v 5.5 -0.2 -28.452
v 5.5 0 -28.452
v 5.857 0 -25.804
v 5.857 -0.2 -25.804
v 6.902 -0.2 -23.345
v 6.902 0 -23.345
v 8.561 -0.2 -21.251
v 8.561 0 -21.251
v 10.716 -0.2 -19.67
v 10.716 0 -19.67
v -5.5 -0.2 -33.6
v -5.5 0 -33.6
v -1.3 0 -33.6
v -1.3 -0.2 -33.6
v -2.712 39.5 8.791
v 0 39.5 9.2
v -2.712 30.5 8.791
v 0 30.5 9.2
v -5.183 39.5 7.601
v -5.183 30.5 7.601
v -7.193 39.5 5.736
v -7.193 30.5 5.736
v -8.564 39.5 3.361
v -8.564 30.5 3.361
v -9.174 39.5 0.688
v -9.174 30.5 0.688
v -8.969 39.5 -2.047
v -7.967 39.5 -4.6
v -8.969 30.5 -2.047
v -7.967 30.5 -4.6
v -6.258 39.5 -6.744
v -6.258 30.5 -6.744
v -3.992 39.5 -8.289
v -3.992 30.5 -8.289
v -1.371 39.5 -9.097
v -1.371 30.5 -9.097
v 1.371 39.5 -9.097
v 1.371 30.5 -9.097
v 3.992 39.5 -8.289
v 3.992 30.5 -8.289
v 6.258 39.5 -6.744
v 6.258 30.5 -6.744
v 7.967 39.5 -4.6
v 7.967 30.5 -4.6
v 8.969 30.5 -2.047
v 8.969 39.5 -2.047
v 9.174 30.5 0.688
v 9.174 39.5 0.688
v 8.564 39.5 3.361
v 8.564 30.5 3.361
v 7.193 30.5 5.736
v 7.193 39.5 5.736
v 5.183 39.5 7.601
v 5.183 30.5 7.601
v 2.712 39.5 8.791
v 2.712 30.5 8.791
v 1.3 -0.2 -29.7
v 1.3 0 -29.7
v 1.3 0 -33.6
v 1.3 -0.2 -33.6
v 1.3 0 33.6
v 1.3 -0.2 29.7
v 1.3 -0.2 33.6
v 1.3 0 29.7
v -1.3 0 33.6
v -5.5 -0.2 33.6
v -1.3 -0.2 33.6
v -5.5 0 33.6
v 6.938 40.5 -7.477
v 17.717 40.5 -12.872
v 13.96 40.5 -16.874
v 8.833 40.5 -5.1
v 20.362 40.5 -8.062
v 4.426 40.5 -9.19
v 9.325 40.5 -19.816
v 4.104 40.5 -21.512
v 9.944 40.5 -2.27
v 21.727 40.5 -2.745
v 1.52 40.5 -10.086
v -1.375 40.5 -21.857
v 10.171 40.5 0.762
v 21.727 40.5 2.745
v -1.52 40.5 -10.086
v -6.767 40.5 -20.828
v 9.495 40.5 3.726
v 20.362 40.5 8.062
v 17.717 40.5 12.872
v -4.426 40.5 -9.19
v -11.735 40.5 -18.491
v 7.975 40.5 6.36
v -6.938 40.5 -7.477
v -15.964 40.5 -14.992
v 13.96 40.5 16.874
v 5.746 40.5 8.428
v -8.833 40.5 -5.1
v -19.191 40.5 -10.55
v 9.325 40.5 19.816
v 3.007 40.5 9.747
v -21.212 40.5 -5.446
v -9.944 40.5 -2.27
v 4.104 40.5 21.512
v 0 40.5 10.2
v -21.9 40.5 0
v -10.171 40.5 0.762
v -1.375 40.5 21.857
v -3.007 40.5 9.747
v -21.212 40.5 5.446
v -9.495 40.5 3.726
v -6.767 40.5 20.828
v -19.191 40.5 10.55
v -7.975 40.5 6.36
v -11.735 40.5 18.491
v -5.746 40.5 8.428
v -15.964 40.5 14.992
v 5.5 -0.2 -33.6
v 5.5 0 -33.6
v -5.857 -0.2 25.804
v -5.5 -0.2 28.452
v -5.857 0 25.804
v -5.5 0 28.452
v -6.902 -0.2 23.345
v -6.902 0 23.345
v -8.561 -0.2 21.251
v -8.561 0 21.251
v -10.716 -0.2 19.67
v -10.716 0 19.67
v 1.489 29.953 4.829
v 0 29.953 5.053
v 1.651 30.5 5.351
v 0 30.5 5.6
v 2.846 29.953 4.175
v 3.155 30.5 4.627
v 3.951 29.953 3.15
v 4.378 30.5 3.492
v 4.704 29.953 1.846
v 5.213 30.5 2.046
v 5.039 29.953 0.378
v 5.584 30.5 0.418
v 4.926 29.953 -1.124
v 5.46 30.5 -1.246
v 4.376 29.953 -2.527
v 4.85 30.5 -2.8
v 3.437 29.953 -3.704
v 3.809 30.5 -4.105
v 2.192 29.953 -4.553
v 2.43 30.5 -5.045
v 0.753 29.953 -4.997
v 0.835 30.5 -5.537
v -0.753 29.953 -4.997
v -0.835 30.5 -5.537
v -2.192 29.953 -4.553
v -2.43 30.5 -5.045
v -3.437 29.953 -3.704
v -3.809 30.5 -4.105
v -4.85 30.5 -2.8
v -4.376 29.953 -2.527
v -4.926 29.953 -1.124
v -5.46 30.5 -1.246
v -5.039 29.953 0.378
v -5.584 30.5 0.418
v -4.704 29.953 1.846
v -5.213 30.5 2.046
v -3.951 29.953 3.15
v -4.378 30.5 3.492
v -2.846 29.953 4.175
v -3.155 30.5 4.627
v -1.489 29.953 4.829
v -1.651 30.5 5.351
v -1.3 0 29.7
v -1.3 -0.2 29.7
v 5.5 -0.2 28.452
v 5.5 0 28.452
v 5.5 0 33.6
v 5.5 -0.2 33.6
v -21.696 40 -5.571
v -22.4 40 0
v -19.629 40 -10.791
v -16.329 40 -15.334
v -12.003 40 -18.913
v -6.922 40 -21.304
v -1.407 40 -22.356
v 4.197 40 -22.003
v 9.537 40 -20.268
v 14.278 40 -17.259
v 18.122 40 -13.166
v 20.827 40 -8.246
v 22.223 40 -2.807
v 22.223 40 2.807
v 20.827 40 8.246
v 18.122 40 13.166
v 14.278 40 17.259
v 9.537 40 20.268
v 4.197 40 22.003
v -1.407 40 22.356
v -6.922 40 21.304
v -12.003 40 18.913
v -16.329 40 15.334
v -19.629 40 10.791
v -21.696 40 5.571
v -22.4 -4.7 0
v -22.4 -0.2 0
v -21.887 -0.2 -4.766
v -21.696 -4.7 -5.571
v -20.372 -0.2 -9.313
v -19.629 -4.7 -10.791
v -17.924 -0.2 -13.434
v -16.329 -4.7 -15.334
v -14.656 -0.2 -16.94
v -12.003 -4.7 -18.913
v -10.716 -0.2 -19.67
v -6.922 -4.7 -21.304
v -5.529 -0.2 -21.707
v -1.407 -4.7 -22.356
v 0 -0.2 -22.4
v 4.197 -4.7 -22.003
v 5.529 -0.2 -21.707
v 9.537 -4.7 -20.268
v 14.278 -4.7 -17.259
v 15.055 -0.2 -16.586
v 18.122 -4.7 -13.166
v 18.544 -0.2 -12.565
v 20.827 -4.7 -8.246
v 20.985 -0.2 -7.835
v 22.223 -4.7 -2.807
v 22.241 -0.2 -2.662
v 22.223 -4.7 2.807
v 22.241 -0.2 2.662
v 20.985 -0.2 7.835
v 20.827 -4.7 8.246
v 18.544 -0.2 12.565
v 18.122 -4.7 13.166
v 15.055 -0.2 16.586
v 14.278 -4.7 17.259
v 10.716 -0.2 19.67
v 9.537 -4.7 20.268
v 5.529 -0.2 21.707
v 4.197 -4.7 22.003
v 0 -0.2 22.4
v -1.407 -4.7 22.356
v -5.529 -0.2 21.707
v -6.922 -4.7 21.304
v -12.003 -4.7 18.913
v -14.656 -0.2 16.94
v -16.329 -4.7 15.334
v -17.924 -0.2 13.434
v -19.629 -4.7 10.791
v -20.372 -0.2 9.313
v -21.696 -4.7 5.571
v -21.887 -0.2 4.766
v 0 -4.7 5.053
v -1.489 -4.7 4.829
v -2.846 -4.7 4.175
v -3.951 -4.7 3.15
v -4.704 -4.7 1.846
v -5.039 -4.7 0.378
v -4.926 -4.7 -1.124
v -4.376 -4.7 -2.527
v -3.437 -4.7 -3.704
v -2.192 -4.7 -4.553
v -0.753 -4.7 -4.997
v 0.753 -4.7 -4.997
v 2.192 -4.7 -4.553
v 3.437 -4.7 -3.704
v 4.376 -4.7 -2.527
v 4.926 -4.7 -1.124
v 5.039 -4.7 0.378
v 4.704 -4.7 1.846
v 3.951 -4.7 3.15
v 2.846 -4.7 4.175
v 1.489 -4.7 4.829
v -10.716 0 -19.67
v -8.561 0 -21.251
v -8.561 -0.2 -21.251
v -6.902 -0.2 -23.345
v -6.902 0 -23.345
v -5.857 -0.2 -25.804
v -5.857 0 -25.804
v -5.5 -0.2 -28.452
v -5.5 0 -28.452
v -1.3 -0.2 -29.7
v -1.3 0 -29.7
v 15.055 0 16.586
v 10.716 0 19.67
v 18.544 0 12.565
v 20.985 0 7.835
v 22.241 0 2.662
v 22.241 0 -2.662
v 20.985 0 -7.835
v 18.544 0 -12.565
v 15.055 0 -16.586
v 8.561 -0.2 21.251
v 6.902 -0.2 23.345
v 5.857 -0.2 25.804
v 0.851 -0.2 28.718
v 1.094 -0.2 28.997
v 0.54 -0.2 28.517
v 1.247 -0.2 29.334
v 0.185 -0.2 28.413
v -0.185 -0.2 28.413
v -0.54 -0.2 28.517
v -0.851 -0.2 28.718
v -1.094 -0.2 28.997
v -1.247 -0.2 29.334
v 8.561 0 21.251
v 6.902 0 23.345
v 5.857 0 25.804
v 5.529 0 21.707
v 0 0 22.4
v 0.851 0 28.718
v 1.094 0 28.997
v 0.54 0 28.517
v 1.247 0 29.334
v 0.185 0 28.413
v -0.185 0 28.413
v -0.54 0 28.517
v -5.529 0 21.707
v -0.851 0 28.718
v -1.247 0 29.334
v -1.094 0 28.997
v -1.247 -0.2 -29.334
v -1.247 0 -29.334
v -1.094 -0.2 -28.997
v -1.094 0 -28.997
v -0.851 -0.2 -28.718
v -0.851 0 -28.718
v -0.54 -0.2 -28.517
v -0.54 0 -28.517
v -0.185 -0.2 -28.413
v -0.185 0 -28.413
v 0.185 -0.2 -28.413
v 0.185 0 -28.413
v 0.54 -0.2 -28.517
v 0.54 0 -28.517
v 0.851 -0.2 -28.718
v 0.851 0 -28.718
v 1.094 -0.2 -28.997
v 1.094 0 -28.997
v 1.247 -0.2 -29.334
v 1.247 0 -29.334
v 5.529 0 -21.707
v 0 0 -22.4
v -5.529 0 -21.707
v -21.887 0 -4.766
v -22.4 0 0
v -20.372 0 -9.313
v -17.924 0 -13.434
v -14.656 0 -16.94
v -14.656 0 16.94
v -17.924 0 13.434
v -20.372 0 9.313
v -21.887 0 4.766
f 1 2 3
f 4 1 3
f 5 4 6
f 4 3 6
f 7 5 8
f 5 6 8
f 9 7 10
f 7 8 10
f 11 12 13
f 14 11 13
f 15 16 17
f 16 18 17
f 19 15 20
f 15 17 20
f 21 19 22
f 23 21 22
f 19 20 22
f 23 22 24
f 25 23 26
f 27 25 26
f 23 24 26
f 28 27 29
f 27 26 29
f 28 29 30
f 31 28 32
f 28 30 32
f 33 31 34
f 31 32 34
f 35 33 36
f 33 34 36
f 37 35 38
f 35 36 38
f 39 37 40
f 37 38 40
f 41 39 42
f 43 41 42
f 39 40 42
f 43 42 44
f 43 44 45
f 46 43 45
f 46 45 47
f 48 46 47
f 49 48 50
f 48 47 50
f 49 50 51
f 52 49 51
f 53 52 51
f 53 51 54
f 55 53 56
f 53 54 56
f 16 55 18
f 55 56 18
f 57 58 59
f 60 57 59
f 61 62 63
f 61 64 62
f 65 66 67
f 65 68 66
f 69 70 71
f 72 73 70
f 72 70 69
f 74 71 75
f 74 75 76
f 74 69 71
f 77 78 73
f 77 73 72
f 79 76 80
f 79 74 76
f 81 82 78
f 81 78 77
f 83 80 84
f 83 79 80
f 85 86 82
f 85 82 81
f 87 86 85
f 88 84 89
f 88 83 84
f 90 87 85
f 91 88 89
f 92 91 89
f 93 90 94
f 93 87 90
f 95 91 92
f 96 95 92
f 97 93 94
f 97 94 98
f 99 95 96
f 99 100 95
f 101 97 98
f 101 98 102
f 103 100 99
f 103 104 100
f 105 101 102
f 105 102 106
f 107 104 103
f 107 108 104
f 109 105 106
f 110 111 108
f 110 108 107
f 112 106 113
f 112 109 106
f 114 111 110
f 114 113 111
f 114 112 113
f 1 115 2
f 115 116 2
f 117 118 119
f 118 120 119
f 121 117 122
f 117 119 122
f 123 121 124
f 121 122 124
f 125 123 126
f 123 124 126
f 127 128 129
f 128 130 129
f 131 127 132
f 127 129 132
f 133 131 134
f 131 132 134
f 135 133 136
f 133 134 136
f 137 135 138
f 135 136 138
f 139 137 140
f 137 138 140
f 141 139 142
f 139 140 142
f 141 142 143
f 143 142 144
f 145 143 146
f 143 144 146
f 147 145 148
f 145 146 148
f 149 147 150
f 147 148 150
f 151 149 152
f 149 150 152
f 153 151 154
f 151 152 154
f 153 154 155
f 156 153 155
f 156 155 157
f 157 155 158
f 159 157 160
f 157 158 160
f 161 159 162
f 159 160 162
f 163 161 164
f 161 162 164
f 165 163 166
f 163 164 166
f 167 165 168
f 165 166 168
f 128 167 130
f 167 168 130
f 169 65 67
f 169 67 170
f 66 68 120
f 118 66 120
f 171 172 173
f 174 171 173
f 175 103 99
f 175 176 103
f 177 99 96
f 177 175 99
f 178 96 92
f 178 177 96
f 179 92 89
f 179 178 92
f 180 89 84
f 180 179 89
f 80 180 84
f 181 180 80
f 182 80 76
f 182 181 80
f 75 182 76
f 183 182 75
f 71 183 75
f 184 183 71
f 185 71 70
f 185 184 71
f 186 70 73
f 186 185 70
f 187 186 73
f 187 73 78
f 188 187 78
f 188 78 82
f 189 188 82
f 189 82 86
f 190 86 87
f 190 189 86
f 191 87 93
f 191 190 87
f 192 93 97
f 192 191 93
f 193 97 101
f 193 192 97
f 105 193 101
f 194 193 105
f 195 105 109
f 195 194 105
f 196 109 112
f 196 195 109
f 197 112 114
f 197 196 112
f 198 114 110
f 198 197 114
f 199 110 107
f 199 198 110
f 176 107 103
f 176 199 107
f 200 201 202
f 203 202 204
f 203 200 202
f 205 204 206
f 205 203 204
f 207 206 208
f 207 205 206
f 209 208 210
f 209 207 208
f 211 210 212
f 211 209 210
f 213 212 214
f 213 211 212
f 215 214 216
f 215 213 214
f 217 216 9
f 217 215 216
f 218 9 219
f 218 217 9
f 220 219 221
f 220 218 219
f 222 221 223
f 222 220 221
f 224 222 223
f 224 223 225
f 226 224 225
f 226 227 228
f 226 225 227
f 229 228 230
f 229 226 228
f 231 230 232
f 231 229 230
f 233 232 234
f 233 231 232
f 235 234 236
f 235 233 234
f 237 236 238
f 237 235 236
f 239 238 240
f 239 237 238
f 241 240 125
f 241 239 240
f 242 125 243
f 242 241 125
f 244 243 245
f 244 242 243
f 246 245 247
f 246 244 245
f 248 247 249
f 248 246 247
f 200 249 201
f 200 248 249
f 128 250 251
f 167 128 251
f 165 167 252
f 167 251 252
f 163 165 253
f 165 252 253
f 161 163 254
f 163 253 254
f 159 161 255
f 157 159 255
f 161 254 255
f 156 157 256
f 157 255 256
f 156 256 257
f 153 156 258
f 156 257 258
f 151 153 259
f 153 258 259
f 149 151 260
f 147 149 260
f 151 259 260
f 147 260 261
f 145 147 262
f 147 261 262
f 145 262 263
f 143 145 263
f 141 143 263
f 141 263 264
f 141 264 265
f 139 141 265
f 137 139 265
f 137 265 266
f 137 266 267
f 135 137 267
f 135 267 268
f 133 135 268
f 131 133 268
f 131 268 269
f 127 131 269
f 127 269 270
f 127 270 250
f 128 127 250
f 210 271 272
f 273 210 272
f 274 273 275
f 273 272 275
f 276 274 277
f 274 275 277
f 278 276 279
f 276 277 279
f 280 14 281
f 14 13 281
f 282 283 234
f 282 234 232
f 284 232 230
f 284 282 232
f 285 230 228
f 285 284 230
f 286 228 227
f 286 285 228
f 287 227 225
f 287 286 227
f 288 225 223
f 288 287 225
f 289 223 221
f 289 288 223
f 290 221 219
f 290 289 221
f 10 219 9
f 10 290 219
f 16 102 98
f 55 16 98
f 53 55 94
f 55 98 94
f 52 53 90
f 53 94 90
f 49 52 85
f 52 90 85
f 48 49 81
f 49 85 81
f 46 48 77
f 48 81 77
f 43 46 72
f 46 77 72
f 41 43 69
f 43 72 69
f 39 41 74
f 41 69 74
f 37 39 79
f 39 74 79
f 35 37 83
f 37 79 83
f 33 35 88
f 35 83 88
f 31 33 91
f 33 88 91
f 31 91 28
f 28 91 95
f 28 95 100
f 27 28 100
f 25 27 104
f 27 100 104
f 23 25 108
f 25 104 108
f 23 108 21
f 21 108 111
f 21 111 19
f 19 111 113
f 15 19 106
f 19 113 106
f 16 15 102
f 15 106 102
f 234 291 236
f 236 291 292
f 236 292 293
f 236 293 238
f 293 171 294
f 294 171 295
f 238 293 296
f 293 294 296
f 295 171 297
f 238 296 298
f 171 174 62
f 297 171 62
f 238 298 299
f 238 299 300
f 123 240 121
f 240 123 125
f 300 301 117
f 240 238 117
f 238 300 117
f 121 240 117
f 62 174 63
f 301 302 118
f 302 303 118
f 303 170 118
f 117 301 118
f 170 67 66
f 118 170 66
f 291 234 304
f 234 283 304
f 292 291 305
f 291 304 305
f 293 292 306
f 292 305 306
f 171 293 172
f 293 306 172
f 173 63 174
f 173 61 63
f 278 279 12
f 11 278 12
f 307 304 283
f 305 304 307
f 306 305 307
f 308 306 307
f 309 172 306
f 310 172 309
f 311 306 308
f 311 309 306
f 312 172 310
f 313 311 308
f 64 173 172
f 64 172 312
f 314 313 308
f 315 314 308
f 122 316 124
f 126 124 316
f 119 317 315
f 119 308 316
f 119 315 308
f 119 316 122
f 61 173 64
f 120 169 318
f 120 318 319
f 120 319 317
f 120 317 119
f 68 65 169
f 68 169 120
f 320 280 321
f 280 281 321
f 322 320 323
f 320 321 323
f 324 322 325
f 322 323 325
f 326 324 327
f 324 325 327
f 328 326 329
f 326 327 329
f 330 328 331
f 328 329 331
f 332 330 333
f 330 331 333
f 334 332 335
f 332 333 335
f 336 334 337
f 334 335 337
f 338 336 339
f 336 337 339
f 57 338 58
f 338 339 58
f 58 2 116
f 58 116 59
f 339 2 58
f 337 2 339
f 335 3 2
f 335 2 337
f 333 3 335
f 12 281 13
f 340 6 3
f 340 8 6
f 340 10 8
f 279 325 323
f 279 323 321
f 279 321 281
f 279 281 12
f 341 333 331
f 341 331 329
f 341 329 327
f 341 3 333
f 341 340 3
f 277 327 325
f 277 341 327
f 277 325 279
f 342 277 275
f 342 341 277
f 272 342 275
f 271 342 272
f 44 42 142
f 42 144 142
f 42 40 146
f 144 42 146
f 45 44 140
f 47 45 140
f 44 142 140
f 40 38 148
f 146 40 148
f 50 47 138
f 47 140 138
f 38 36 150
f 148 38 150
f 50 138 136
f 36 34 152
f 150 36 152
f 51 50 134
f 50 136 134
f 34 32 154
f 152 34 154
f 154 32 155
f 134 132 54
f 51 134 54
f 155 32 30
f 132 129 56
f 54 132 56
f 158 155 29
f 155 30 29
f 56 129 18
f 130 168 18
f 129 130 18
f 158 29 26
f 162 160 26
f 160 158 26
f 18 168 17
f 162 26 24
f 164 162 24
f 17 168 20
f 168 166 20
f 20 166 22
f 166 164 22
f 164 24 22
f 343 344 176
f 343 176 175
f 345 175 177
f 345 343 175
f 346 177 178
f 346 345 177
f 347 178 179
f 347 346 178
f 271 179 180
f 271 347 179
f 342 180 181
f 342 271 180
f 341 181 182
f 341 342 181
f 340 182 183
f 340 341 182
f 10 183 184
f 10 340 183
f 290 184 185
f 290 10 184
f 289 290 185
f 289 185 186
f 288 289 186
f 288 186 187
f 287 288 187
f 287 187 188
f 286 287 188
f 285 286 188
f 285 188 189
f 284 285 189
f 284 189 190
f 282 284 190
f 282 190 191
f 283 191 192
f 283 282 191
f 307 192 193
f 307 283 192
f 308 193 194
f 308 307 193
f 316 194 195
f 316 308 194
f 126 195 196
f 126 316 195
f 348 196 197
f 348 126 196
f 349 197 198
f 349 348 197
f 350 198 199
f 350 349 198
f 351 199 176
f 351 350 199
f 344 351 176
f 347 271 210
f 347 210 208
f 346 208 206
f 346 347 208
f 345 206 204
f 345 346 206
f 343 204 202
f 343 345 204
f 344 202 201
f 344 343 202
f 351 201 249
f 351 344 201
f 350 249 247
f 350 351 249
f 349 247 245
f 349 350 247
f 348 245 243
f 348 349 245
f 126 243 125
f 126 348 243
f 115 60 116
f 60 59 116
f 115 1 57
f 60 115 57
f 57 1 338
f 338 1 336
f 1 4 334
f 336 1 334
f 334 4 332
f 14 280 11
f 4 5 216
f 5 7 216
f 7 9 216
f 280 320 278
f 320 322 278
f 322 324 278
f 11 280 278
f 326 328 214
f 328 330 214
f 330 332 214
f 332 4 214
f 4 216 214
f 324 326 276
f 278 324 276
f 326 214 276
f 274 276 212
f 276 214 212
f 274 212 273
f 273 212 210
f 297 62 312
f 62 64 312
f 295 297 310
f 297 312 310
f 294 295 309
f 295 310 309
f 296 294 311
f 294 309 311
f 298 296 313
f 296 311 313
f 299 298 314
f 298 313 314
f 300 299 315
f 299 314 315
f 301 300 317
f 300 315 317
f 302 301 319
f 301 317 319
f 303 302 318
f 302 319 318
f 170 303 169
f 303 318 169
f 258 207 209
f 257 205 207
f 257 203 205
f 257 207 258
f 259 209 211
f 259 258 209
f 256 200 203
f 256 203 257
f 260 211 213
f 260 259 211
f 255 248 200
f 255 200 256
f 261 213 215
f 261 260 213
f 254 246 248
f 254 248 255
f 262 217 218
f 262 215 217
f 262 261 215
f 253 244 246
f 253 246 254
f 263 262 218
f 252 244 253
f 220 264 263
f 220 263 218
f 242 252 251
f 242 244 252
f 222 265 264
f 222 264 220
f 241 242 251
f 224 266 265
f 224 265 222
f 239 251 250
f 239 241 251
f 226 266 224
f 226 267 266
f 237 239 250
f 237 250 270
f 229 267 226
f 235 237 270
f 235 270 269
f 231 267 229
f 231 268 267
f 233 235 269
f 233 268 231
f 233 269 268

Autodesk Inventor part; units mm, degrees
sketch "Sketch1" plane through (0, 0, 0) normal (0, 1, 0) x (-1, 0, 0)
  circle A0 centre (0, 0) radius 22.4
  dimension "d0" = 44.8
ref_plane "Work Plane1" through (0, 40.5, 0) normal (0, 1, 0) x (-1, 0, 0)
sketch "Sketch2" plane through (0, 40.5, 0) normal (0, 1, 0) x (-1, 0, 0)
  circle A0 centre (0, 0) radius 22.4 projected
ref_plane "Work Plane3" through (0, -53, 0) normal (0, 1, 0) x (-1, 0, 0)
ref_plane "Work Plane2" through (0, -41, 0) normal (0, 1, 0) x (-1, 0, 0)
sketch "Sketch3" plane through (0, -41, 0) normal (0, 1, 0) x (-1, 0, 0)
  circle A0 centre (0, 0) radius 33.8
  dimension "d4" = 67.6
sketch "Sketch4" plane through (0, -53, 0) normal (0, 1, 0) x (-1, 0, 0)
  circle A0 centre (0, 0) radius 33.8 projected
loft "Loft1" add profiles "Sketch2", "Sketch1"
loft "Loft3" [suppressed]
sketch "Sketch5" plane through (0, 0, 0) normal (0, 1, 0) x (-1, 0, 0)
  line L0 (-5.5, 33.6) -> (5.5, -33.6) construction
  line L1 (3.6185, 22.1058) -> (-5.5, -33.6) construction
  line L2 (5.5, 33.6) -> (5.5, 28.4519)
  line L3 (5.5, -28.4519) -> (5.5, -33.6)
  line L4 (-5.5, -33.6) -> (-5.5, -28.4519)
  line L5 (-5.5, 28.4519) -> (-5.5, 33.6)
  arc A0 (-10.716, 19.6704) -> (-10.716, -19.6704) centre (0, 0) ccw
  arc A1 (10.716, -19.6704) -> (10.716, 19.6704) centre (0, 0) ccw
  arc A2 (5.5, 28.4519) -> (10.716, 19.6704) centre (15.5, 28.4519) ccw
  arc A3 (-10.716, 19.6704) -> (-5.5, 28.4519) centre (-15.5, 28.4519) ccw
  arc A4 (10.716, -19.6704) -> (5.5, -28.4519) centre (15.5, -28.4519) ccw
  arc A5 (-5.5, -28.4519) -> (-10.716, -19.6704) centre (-15.5, -28.4519) ccw
  circle A6 centre (0, 0) radius 22.4 construction
  line L6 (0, -22.4) -> (0, -33.6) construction
  line L7 (1.3, -33.6) -> (1.3, -29.7)
  line L8 (0, -28.4) -> (0, -28.4)
  line L9 (-1.3, -29.7) -> (-1.3, -33.6)
  arc A7 (1.3, -29.7) -> (0, -28.4) centre (0, -29.7) ccw
  arc A8 (0, -28.4) -> (-1.3, -29.7) centre (0, -29.7) ccw
  line L10 (5.5, -33.6) -> (1.3, -33.6)
  line L11 (-1.3, -33.6) -> (-5.5, -33.6)
  circle A9 centre (0, 0) radius 33.8 construction
  line L12 (33.8, 0) -> (-33.8, 0) construction
  line L13 (0, 22.4) -> (0, 33.6) construction
  line L14 (1.3, 33.6) -> (1.3, 29.7)
  line L15 (-1.3, 29.7) -> (-1.3, 33.6)
  arc A10 (0, 28.4) -> (1.3, 29.7) centre (0, 29.7) ccw
  arc A11 (-1.3, 29.7) -> (0, 28.4) centre (0, 29.7) ccw
  line L16 (5.5, 33.6) -> (1.3, 33.6)
  line L17 (-1.3, 33.6) -> (-5.5, 33.6)
  circle A12 centre (0, 0) radius 33.8 construction
  point P0 (5.5, 21.7143)
  point P1 (5.5, -21.7143)
  point P2 (-5.5, 21.7143)
  point P3 (-5.5, -21.7143)
  point P4 (1.3, -28.4)
  point P5 (-1.3, -28.4)
  point P6 (1.3, 28.4)
  point P7 (-1.3, 28.4)
  point P8 (0, 28.4)
  dimension "d17" = 11
  dimension "d18" = 67.2
  dimension "d19" = 10
  dimension "d20" = 2.6
  dimension "d21" = 5.2
  dimension "d22" = 1.3
extrude "Extrusion1" add sketch "Sketch5" against normal blind 0.2
ref_plane "Work Plane4" through (0, -4.7, 0) normal (0, 1, 0) x (-1, 0, 0)
sketch "Sketch6" plane through (0, -4.7, 0) normal (0, 1, 0) x (-1, 0, 0)
  circle A0 centre (0, 0) radius 22.4 projected
ref_plane "Work Plane5" through (0, -53, 0) normal (0, 1, 0) x (-1, 0, 0)
sketch "Sketch7" plane through (0, -53, 0) normal (0, 1, 0) x (-1, 0, 0)
  circle A0 centre (0, 0) radius 33.8 projected
loft "Loft4" add profiles "Sketch7", "Sketch3"
loft "Loft5" add profiles "Sketch6" section 1 edges at (33.8, -41, 0)
sketch "Sketch8" plane through (0, 0, 0) normal (0, 1, 0) x (-1, 0, 0)
  circle A0 centre (0, 0) radius 22.4 projected
loft "Loft6" add profiles "Sketch8" section 2 edges at (22.4, -4.7, 0)
sketch "Sketch9" plane through (0, 40.5, 0) normal (0, 1, 0) x (1, 0, 0)
  point P0 (0, 0)
  point P1 (0, 0)
hole "Hole1" at (0, 40.5, 0) direction (0, -1, 0) diameter 18.4 depth 10
chamfer "Chamfer1" distance 1 angle 45 1 edges at (0, 40.5, -9.2)
chamfer "Chamfer2" distance 0.5 angle 45 1 edges at (22.4, 40.5, 0)
sketch "Sketch10" plane through (0, -53, 0) normal (0, -1, 0) x (1, 0, 0)
  point P0 (0, 0)
  point P1 (0, 0)
hole "Hole2" at (0, -53, 0) direction (0, 1, 0) diameter 13.5 depth 10
sketch "Sketch11" plane through (0, -53, 0) normal (0, -1, 0) x (1, 0, 0)
  line L0 (56, 85) -> (-56, 85)
  line L1 (-56, 85) -> (-56, -85)
  line L2 (-56, -85) -> (56, -85)
  line L3 (56, -85) -> (56, 85)
  line L4 (56, 85) -> (-56, -85) construction
  line L5 (-56, 85) -> (56, -85) construction
  point P0 (0, 0)
extrude "Extrusion2" cut sketch "Sketch11" against normal blind 48.3
sketch "Sketch12" plane through (0, 30.5, 0) normal (0, 1, 0) x (1, 0, 0)
  circle A0 centre (0, 0) radius 9.2
hole "Hole3" at (0, 30.5, 0) direction (0, -1, 0) diameter 10.106 end through all countersink diameter 11.2 countersink angle 90 thread size "M12x1.75" class "6H" standard "ISO Metric profile"
properties part number "shaker cut"
